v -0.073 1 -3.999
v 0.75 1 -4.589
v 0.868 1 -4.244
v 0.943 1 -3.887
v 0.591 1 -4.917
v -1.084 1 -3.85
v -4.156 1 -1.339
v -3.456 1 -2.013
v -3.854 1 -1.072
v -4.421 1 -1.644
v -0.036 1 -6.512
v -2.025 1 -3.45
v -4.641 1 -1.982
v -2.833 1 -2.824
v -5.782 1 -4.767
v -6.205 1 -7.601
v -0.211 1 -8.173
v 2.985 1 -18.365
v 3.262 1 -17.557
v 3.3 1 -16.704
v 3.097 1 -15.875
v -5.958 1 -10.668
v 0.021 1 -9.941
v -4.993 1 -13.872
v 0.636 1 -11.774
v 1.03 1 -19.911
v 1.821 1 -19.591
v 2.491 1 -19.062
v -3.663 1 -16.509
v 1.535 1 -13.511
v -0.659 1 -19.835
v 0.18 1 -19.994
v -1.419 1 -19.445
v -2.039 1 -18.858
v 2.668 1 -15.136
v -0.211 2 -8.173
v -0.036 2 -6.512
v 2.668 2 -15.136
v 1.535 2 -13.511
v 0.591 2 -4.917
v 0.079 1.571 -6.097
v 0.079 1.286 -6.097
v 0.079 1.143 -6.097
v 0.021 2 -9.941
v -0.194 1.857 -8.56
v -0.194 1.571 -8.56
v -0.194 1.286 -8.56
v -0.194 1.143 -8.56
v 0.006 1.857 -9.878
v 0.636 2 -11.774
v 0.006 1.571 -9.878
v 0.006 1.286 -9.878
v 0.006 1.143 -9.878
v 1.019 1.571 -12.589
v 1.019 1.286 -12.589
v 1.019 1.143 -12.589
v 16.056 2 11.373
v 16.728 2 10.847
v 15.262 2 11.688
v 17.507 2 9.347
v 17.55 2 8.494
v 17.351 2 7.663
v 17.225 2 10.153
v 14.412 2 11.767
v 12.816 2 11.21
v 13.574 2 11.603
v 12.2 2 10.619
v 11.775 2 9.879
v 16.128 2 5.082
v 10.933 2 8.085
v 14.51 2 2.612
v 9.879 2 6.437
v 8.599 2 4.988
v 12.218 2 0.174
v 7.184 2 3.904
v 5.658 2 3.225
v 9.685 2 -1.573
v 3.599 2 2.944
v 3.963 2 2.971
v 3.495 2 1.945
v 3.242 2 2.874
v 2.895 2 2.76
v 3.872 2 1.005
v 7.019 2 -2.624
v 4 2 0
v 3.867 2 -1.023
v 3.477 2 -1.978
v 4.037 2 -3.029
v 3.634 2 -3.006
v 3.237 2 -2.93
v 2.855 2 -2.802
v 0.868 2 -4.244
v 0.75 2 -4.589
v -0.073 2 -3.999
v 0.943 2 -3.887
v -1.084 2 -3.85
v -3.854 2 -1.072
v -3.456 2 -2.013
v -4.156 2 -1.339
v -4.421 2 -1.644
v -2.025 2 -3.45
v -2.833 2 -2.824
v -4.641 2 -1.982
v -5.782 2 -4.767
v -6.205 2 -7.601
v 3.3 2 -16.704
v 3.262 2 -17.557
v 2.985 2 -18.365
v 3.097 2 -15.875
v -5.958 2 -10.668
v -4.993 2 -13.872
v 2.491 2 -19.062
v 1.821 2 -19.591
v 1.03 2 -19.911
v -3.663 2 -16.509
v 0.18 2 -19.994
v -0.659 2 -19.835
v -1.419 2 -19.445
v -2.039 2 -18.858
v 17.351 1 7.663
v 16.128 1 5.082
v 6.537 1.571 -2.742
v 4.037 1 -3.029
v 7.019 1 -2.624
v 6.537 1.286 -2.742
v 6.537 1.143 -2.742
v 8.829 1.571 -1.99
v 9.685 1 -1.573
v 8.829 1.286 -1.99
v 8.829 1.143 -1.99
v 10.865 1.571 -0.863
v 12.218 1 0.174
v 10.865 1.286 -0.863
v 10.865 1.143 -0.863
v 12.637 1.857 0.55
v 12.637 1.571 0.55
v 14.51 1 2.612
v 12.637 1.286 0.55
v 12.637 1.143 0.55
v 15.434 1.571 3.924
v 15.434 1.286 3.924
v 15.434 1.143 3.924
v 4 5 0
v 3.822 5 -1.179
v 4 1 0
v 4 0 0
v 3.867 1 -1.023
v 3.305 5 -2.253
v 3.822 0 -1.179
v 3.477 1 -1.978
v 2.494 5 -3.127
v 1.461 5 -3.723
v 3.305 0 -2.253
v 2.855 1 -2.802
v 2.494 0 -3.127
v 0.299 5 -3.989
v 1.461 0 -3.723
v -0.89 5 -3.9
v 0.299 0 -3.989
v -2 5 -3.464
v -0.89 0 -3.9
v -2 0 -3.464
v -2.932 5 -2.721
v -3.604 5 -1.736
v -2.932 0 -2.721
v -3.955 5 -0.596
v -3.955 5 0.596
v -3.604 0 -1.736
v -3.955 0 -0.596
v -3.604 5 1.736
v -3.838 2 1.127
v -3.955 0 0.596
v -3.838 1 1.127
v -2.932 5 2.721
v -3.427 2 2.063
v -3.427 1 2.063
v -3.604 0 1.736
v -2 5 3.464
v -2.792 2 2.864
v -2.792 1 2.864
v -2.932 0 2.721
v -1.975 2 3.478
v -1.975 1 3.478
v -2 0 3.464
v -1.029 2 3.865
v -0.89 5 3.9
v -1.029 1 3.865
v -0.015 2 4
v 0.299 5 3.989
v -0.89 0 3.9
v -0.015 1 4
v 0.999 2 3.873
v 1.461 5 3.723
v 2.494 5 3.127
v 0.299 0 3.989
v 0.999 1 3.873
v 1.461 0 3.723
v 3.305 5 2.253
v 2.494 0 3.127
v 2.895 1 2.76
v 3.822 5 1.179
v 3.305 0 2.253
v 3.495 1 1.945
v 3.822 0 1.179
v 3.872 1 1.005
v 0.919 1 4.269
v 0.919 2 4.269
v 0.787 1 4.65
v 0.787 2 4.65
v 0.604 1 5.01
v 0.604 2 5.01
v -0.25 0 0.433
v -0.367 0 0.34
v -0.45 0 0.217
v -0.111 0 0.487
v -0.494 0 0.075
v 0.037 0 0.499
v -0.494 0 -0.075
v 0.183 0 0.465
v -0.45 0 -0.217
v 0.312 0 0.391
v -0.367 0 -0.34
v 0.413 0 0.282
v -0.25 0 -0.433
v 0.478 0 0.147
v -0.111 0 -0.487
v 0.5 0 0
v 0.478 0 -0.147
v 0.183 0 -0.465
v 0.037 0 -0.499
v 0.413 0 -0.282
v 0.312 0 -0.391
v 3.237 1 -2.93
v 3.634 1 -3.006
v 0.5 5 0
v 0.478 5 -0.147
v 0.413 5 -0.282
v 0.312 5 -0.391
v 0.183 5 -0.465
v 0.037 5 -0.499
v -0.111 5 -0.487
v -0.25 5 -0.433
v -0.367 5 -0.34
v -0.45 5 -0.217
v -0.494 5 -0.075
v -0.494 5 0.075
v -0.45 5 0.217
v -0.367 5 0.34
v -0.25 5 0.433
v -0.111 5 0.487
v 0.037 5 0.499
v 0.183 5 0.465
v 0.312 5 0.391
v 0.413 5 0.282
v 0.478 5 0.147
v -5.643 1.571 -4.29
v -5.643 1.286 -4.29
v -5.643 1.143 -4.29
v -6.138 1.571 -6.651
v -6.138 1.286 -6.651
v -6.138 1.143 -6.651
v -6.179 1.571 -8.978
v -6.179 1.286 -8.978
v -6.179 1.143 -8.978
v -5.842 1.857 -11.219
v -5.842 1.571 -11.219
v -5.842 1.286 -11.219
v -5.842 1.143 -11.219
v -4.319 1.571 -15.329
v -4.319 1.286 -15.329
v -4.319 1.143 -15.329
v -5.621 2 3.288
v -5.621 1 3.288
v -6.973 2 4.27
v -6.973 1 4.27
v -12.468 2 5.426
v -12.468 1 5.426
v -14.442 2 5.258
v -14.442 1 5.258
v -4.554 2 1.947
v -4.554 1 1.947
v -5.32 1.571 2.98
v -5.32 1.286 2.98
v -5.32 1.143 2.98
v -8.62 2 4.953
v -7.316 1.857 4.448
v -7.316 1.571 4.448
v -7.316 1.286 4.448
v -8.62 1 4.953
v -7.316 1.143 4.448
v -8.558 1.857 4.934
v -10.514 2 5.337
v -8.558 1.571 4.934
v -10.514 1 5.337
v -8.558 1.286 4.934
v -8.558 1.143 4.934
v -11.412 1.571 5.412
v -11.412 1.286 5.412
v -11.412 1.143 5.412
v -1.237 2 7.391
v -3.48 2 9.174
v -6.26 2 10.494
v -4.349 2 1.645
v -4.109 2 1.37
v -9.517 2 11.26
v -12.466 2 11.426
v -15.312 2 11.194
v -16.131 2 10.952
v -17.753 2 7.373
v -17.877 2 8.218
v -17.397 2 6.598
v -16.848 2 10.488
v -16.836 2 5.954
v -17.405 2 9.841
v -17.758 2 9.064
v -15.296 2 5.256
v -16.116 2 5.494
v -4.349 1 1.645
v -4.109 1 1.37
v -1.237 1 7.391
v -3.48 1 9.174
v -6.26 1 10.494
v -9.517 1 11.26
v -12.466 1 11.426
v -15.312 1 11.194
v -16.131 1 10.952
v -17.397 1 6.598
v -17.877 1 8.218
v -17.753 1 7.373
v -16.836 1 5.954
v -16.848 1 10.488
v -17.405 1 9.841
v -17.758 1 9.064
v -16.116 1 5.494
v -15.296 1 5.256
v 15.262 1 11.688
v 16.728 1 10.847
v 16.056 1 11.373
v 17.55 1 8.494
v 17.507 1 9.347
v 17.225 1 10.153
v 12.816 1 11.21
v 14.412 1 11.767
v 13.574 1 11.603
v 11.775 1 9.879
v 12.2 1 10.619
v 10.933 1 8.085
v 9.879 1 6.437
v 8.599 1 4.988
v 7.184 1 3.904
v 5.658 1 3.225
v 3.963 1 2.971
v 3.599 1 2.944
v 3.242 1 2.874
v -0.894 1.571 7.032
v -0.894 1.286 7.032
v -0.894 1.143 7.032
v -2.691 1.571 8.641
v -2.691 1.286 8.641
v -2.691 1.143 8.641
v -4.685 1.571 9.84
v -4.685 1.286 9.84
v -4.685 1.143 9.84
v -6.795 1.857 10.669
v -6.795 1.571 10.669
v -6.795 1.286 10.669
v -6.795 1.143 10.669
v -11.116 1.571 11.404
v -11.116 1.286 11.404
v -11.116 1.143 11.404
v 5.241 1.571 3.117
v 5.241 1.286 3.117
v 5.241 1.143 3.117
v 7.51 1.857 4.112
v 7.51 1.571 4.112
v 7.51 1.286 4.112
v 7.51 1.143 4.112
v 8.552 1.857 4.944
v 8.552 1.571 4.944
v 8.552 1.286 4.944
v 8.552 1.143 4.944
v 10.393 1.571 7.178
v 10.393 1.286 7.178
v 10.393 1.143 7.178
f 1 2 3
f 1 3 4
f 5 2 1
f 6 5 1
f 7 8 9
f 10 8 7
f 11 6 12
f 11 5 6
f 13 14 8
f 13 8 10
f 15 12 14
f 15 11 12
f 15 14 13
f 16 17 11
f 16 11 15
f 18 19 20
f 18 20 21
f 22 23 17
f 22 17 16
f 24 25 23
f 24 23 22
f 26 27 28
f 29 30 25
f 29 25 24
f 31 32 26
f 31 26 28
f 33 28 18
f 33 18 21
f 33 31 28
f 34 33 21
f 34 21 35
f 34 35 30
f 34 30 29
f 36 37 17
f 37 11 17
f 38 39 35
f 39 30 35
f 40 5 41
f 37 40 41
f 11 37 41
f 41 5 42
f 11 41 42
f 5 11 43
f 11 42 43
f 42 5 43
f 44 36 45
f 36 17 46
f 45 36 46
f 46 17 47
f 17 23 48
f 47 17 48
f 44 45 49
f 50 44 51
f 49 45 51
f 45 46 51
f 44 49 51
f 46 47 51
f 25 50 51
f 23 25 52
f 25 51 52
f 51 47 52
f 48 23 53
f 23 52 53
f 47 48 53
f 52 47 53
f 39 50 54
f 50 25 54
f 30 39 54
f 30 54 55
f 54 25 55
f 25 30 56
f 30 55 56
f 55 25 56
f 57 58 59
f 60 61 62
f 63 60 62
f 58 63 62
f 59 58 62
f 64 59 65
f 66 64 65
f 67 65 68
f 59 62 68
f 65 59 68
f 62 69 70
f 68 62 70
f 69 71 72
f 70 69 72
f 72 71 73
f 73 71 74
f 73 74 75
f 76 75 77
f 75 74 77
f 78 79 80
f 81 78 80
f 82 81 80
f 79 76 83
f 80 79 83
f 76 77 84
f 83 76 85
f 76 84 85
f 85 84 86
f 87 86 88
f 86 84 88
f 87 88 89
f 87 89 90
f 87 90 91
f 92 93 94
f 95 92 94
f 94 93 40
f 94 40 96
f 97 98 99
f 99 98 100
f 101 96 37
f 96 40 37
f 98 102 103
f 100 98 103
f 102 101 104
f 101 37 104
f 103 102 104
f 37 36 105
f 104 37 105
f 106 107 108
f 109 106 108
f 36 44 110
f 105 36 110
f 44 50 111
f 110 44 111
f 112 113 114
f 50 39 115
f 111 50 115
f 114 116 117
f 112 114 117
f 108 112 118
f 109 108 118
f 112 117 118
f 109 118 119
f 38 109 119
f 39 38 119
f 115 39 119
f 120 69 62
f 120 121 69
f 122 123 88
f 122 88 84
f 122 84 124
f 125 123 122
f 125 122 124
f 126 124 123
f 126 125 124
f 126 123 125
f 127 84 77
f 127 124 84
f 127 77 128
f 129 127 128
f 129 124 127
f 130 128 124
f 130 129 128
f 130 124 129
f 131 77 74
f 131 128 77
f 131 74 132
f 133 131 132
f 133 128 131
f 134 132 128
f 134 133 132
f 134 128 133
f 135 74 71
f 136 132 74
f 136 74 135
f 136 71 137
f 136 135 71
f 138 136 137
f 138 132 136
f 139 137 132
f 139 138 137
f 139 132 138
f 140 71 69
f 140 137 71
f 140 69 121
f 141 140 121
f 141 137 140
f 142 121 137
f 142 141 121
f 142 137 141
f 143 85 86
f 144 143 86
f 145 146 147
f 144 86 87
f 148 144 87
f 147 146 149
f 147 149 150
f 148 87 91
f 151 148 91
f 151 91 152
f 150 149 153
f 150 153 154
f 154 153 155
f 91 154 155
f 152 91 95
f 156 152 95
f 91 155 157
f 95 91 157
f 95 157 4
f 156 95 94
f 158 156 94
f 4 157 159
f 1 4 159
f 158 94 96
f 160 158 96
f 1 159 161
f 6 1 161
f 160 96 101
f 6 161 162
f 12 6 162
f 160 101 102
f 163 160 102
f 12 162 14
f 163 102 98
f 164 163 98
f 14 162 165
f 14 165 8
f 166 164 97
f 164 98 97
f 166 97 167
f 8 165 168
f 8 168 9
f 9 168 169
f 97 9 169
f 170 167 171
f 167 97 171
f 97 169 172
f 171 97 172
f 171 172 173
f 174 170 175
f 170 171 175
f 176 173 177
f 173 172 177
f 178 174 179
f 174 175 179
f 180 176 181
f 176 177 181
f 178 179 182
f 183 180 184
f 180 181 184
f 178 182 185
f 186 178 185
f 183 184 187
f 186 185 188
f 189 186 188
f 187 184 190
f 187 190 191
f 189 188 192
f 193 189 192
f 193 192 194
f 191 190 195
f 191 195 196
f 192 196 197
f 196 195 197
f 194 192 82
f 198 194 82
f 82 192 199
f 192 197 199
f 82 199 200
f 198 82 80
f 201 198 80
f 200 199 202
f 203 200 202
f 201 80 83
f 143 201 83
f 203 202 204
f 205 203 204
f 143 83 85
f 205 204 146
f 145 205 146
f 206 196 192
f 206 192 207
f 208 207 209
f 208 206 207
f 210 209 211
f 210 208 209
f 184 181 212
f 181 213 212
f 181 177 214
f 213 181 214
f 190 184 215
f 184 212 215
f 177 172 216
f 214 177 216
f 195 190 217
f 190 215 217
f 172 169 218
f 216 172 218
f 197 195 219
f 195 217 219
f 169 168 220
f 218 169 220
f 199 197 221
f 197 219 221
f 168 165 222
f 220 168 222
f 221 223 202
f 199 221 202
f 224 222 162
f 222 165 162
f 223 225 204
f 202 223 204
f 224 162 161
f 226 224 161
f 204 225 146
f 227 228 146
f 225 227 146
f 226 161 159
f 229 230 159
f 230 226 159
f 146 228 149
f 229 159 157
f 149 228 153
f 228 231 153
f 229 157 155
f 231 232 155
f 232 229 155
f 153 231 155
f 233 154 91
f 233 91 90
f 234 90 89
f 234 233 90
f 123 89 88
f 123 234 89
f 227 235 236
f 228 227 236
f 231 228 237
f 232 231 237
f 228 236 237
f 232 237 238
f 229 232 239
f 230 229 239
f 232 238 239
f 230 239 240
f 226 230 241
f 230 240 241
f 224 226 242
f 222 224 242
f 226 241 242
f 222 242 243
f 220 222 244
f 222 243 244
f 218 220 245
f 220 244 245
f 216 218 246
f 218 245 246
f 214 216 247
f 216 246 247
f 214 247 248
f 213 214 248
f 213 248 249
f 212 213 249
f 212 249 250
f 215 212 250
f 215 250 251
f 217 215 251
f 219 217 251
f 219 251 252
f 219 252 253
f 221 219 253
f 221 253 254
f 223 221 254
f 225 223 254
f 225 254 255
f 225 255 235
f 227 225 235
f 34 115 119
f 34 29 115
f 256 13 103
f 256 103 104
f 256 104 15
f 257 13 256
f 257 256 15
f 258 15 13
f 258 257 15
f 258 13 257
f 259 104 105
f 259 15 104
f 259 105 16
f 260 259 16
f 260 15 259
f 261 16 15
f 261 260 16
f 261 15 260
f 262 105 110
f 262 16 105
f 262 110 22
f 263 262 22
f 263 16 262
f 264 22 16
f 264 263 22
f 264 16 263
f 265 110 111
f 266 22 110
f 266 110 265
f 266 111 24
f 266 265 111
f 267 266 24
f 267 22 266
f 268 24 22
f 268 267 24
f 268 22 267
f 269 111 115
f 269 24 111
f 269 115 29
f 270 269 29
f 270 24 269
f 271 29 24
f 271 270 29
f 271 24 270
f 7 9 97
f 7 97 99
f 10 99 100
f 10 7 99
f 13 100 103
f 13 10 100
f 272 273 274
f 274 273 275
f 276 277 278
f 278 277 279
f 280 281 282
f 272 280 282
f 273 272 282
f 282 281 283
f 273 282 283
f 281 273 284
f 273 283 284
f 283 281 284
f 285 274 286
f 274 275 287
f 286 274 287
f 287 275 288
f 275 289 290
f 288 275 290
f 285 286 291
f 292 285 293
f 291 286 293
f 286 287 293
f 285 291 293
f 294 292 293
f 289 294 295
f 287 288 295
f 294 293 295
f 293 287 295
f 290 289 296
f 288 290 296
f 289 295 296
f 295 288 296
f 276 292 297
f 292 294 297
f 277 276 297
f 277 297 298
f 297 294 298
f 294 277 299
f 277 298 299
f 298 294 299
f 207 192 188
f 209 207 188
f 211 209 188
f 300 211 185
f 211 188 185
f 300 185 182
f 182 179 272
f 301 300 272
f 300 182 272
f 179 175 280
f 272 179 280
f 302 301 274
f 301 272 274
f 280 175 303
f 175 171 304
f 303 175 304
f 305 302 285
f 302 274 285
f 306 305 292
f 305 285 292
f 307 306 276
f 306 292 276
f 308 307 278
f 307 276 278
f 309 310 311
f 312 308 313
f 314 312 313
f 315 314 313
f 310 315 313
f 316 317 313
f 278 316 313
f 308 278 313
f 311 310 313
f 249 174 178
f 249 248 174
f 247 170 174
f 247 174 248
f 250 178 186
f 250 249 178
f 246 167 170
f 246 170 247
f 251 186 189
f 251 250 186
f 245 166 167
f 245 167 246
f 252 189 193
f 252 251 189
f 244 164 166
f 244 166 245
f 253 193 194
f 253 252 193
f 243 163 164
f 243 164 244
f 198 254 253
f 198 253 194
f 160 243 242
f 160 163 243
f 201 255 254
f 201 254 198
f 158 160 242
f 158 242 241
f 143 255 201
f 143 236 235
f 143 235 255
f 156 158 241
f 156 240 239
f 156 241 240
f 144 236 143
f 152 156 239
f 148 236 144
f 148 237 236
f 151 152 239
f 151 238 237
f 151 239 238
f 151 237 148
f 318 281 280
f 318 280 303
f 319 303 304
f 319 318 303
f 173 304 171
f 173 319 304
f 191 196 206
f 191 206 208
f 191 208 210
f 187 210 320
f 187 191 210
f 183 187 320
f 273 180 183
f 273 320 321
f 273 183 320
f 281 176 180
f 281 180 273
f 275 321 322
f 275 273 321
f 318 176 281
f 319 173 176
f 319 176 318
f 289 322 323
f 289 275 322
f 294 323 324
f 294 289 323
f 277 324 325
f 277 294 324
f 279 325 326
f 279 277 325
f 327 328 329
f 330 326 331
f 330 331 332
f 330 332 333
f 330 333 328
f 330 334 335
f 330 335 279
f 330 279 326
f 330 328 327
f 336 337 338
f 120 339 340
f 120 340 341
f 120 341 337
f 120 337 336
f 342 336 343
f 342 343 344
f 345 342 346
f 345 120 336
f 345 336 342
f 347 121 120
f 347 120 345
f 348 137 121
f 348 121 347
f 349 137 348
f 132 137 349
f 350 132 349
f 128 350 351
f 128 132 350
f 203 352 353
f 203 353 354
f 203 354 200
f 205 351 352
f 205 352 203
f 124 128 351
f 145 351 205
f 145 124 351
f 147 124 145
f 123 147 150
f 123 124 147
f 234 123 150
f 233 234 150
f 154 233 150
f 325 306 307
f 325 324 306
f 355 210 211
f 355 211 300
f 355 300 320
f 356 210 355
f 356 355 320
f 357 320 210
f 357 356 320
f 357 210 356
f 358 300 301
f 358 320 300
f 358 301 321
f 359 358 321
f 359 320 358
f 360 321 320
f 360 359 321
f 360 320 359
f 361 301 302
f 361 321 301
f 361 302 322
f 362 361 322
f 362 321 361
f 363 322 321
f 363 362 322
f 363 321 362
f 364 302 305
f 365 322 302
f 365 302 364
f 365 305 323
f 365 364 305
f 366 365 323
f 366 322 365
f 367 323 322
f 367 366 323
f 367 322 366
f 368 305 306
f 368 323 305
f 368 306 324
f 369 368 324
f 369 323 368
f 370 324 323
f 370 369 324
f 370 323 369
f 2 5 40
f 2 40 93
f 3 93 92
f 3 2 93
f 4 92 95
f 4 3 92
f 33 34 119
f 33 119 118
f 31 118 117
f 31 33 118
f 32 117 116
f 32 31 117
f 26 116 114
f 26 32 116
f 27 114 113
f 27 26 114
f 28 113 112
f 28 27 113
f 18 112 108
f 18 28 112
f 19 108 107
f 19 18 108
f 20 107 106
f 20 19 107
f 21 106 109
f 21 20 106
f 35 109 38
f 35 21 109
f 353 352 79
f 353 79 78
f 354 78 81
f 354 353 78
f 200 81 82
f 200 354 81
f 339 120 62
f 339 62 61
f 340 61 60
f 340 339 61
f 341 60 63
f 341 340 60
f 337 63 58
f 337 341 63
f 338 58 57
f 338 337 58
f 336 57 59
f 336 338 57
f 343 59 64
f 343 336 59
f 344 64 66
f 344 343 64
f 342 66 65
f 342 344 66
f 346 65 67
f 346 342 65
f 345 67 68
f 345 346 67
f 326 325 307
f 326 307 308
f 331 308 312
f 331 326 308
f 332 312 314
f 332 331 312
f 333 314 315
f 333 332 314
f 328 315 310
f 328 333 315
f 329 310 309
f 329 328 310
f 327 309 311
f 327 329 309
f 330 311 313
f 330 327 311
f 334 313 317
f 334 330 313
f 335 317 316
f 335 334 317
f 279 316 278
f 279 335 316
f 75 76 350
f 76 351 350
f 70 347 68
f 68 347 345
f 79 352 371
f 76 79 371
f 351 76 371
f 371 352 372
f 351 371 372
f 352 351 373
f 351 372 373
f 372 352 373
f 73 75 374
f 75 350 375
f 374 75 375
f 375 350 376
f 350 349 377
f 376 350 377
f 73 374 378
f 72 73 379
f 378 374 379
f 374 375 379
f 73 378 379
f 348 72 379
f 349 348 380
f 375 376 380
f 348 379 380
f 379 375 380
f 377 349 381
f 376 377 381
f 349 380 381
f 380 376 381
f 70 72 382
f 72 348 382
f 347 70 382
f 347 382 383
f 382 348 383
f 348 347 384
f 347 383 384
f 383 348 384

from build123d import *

# Parameters (mm, degrees)
SKETCH1_R               = 4
BOSS_EXTRUDE1_DEPTH     = 5
BOSS_EXTRUDE2_START     = 1
BOSS_EXTRUDE2_DEPTH     = 1
SKETCH3_R               = 0.5
CUT_EXTRUDE1_DEPTH      = 1
CUT_EXTRUDE1_DEPTH_BACK = 6


with BuildPart() as part:
    # Sketch1 → Boss-Extrude1 (new body)
    with BuildSketch(Plane(origin=(0, 0, 0), x_dir=(1, 0, 0), z_dir=(0, 1, 0))):
        Circle(SKETCH1_R)
    extrude(amount=BOSS_EXTRUDE1_DEPTH)

    # Sketch2 → Boss-Extrude2 (add)
    with BuildSketch(Plane(origin=(0, 0, 0), x_dir=(1, 0, 0), z_dir=(0, 1, 0)).offset(BOSS_EXTRUDE2_START)):
        with BuildLine():
            ThreePointArc((3.96292251, -2.970932025), (3.419315306, -2.914444777), (2.894976906, -2.760273305))
            ThreePointArc((2.894976906, -2.760273305), (3.99989603, 0.028840126), (2.854873637, 2.801730986))
            ThreePointArc((2.854873637, 2.801730986), (3.434376926, 2.975056029), (4.036869549, 3.028612277))
            add(Edge.make_bspline(
                [(4.036869549, 3.028612277), (4.461696183, 3.023376101), (5.318698227, 2.968686223), (6.954159562, 2.692039011), (9.640789789, 1.796530328), (12.810078972, -0.41937164), (15.116309585, -3.289140753), (16.531628152, -5.76825703), (17.095168614, -7.020174314), (17.350686676, -7.663372062)],
                knots=[0, 0, 0, 0, 0.0625, 0.125, 0.25, 0.5, 0.75, 0.875, 1, 1, 1, 1], degree=3))
            ThreePointArc((17.350686676, -7.663372062), (15.67022042, -11.559014905), (11.774577577, -9.878548648))
            add(Edge.make_bspline(
                [(3.96292251, -2.970932025), (4.182230159, -2.973635089), (4.62835587, -3.002140243), (5.450410806, -3.141998702), (6.419949985, -3.462832618), (7.519073058, -4.074722518), (8.911985554, -5.187495456), (10.473170644, -7.100700539), (11.40121591, -8.938711436), (11.774577577, -9.878548648)],
                knots=[0, 0, 0, 0, 0.0625, 0.125, 0.25, 0.375, 0.5, 0.75, 1, 1, 1, 1], degree=3))
        make_face()
        with BuildLine():
            ThreePointArc((-3.837955256, -1.126986891), (-1.974971733, -3.478431637), (0.99893339, -3.873258587))
            ThreePointArc((0.99893339, -3.873258587), (0.859285635, -4.461785679), (0.604420396, -5.01033772))
            add(Edge.make_bspline(
                [(0.604420396, -5.01033772), (0.387472417, -5.375630289), (-0.088391429, -6.090470891), (-1.145705609, -7.368498348), (-3.264553992, -9.247434034), (-6.768225979, -10.884167994), (-10.406634241, -11.446537736), (-13.2612712, -11.432681431), (-14.627233602, -11.294763145), (-15.312018222, -11.194449404)],
                knots=[0, 0, 0, 0, 0.0625, 0.125, 0.25, 0.5, 0.75, 0.875, 1, 1, 1, 1], degree=3))
            ThreePointArc((-15.312018222, -11.194449404), (-17.84551076, -7.791301514), (-14.44236287, -5.257808976))
            add(Edge.make_bspline(
                [(-4.554363861, -1.946525554), (-4.666358608, -2.135100018), (-4.914107651, -2.507203639), (-5.446256097, -3.149194868), (-6.208876009, -3.828423469), (-7.288349743, -4.474347022), (-8.948495624, -5.12425816), (-11.385972373, -5.519681567), (-13.441759135, -5.404386894), (-14.44236287, -5.257808976)],
                knots=[0, 0, 0, 0, 0.0625, 0.125, 0.25, 0.375, 0.5, 0.75, 1, 1, 1, 1], degree=3))
            ThreePointArc((-4.554363861, -1.946525554), (-4.233640868, -1.50399153), (-3.837955256, -1.126986891))
        make_face()
        with BuildLine():
            ThreePointArc((0.94297835, 3.887260196), (-2.024924297, 3.449591511), (-3.853807027, 1.071527601))
            ThreePointArc((-3.853807027, 1.071527601), (-4.293662561, 1.48672965), (-4.641289945, 1.981725443))
            add(Edge.make_bspline(
                [(-4.641289945, 1.981725443), (-4.8491686, 2.352254188), (-5.230306799, 3.121784668), (-5.808453952, 4.676459337), (-6.376235797, 7.450903706), (-6.041852992, 11.303539634), (-4.709675344, 14.735678488), (-3.270356952, 17.200938461), (-2.467935012, 18.314937459), (-2.038668454, 18.857821466)],
                knots=[0, 0, 0, 0, 0.0625, 0.125, 0.25, 0.5, 0.75, 0.875, 1, 1, 1, 1], degree=3))
            ThreePointArc((-2.038668454, 18.857821466), (2.17529034, 19.350316419), (2.667785293, 15.136357624))
            add(Edge.make_bspline(
                [(0.591441352, 4.917457579), (0.484128449, 5.108735107), (0.285751781, 5.509343883), (-0.004154708, 6.29119357), (-0.211073976, 7.291256087), (-0.230723315, 8.54906954), (0.03651007, 10.311753616), (0.912801729, 12.620382105), (2.040543226, 14.34309833), (2.667785293, 15.136357624)],
                knots=[0, 0, 0, 0, 0.0625, 0.125, 0.25, 0.375, 0.5, 0.75, 1, 1, 1, 1], degree=3))
            ThreePointArc((0.591441352, 4.917457579), (0.814325562, 4.418436307), (0.94297835, 3.887260196))
        make_face()
    extrude(amount=BOSS_EXTRUDE2_DEPTH)

    # Sketch3 → Cut-Extrude1 (cut, two sides)
    with BuildSketch(Plane(origin=(0, 5, 0), x_dir=(1, 0, 0), z_dir=(0, 1, 0))) as cut_extrude1_sk:
        Circle(SKETCH3_R)
    extrude(amount=CUT_EXTRUDE1_DEPTH, mode=Mode.SUBTRACT)
    extrude(cut_extrude1_sk.sketch, amount=-CUT_EXTRUDE1_DEPTH_BACK, mode=Mode.SUBTRACT)


solid = part.part
